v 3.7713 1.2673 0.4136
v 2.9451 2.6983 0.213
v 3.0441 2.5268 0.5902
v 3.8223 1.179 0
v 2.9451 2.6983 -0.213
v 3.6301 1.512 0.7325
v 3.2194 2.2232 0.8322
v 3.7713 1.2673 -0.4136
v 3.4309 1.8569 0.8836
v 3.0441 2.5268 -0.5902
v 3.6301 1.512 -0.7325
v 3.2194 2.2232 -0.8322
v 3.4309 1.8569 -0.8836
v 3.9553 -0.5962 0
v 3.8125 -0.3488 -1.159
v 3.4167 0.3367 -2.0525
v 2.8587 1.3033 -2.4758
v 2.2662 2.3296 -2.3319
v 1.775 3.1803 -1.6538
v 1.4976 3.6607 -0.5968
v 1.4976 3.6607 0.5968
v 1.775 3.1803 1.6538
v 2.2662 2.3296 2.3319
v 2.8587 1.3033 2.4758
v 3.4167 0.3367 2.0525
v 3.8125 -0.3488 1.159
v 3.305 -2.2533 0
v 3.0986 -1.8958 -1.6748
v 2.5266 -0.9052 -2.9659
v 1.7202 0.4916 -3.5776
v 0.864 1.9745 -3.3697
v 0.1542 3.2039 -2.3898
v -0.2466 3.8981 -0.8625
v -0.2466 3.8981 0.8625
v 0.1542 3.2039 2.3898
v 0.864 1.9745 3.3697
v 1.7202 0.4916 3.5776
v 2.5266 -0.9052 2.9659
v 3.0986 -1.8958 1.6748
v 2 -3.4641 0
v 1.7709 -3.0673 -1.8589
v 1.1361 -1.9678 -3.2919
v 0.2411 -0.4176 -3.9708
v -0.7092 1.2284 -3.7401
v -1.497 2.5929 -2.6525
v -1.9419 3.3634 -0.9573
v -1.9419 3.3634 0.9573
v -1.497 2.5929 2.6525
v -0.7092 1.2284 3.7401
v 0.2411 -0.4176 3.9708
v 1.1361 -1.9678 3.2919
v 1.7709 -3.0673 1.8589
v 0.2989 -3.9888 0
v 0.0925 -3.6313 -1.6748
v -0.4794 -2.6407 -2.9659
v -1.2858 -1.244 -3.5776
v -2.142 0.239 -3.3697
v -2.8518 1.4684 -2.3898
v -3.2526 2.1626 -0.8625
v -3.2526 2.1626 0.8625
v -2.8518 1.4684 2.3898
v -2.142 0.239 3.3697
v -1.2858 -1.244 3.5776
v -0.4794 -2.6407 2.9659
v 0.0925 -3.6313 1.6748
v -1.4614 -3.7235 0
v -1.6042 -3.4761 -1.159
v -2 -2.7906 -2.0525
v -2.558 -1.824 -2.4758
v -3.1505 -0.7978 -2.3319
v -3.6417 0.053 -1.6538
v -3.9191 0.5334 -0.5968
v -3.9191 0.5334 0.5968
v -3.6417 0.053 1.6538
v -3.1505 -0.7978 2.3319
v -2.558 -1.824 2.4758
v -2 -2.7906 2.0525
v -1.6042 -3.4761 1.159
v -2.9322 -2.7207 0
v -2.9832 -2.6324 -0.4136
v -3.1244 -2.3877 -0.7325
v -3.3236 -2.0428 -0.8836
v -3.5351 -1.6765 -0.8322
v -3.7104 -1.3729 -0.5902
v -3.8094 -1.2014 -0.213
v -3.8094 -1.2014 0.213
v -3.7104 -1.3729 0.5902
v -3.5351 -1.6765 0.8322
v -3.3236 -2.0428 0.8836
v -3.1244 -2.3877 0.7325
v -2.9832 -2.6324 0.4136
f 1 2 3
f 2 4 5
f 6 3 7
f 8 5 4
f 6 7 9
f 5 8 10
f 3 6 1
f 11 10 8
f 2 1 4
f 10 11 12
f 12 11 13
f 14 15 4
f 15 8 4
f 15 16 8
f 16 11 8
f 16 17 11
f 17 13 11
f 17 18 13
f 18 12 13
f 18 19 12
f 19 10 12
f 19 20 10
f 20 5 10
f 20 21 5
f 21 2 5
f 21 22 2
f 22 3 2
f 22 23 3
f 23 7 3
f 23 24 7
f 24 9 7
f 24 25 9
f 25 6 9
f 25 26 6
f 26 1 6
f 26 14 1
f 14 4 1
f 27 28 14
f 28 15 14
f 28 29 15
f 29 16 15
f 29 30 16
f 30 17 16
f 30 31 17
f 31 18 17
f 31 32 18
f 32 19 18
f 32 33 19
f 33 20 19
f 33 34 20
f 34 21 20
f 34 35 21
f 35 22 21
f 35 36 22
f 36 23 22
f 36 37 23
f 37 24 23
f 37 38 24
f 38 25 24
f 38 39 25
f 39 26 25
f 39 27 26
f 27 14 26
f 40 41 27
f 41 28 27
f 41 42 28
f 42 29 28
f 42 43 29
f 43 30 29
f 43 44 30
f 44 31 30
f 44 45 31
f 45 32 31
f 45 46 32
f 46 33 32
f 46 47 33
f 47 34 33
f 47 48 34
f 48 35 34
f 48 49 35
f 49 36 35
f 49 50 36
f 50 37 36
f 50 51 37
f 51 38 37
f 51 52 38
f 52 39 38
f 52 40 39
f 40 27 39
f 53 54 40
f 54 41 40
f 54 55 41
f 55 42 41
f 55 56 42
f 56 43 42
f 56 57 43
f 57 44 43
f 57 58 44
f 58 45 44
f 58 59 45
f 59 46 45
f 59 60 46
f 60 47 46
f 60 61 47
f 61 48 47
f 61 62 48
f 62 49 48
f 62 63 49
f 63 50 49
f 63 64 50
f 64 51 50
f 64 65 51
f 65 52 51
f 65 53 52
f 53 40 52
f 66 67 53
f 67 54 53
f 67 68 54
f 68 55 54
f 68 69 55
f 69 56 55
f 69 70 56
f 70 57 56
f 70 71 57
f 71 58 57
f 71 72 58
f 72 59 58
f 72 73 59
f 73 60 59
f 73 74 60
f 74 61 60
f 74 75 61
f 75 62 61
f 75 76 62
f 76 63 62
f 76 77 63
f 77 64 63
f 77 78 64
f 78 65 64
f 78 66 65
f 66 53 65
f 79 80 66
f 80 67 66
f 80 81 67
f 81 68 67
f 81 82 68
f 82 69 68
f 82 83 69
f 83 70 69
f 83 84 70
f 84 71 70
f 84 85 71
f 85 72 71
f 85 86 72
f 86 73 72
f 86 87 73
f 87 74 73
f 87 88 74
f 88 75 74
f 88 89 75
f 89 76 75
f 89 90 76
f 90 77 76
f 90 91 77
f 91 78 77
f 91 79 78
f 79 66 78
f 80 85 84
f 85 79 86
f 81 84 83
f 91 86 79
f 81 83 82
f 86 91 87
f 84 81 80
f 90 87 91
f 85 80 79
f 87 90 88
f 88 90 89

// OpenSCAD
// Generated by generate_scads.py
rotate([90,180,120]) {
  sphere(r=4);
}
